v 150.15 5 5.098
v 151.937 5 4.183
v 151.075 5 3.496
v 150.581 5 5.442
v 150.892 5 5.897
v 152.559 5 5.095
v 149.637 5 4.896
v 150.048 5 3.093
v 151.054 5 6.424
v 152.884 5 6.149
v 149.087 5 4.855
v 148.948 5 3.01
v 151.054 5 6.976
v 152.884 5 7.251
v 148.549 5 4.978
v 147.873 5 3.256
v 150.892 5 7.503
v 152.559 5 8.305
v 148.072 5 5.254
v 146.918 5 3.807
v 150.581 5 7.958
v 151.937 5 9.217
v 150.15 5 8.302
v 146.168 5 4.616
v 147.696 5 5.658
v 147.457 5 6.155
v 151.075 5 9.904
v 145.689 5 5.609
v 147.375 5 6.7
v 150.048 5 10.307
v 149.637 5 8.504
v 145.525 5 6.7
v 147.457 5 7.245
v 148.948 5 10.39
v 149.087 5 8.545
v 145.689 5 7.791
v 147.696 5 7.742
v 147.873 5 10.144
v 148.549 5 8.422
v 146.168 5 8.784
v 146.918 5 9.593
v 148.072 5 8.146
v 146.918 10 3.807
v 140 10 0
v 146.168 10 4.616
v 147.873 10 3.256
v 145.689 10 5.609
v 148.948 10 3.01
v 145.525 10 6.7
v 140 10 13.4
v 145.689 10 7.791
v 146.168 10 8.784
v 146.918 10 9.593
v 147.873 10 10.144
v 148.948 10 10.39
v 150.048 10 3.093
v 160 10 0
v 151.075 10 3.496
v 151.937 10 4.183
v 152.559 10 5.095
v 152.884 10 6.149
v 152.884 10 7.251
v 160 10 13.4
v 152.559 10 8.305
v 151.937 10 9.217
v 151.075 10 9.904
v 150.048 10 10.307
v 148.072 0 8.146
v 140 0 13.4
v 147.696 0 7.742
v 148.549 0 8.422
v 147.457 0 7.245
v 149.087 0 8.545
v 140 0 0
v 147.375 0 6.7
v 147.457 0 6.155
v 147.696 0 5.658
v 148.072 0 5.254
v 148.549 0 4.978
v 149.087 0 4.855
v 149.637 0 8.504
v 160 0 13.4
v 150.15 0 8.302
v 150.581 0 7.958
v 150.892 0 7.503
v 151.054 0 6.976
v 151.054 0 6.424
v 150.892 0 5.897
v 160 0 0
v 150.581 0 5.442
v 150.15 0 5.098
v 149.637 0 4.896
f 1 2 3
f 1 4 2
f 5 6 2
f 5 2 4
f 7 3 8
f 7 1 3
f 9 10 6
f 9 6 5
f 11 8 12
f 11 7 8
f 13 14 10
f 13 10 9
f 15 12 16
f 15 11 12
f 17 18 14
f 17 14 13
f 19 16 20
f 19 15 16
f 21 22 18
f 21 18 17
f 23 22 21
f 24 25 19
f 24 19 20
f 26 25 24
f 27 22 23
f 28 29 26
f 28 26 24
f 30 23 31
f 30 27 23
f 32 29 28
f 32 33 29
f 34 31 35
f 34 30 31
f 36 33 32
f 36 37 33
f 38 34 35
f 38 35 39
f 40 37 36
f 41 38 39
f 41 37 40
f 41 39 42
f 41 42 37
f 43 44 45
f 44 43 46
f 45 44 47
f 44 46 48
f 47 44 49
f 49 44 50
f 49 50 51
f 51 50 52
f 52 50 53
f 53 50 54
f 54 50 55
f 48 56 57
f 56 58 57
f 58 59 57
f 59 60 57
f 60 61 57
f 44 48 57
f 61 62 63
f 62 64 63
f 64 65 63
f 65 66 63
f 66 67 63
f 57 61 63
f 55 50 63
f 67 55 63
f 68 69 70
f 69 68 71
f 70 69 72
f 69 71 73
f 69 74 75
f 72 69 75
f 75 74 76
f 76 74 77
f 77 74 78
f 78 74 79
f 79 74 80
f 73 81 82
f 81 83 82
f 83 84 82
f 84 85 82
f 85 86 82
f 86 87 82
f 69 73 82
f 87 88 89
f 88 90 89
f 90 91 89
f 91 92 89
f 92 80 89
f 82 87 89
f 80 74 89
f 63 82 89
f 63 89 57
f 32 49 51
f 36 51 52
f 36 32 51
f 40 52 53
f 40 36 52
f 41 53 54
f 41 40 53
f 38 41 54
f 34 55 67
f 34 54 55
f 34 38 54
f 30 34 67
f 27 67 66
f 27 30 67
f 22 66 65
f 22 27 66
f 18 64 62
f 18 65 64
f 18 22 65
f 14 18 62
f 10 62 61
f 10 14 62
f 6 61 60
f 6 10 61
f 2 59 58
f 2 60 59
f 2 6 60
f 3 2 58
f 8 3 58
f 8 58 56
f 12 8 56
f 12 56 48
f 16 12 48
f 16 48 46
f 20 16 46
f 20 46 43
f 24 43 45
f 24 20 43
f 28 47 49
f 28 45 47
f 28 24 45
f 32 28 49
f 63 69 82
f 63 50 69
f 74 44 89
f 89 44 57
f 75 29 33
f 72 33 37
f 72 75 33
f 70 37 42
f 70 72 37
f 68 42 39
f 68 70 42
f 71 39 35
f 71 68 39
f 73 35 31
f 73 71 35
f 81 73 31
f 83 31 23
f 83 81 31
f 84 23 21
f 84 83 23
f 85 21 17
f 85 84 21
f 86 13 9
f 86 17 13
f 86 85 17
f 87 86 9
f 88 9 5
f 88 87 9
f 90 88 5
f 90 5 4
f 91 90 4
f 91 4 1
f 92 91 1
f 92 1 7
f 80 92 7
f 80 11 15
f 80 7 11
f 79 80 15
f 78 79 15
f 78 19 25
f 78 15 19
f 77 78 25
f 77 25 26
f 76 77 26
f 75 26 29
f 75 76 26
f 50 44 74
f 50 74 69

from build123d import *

# Parameters (mm, degrees)
PAD_DEPTH              = 13.4
CYLINDER_W             = 6.7
CYLINDER_H             = 298.45
CYLINDER_ANGLE         = 180
CYLINDER001_R          = 99.483333
CYLINDER001_DEPTH      = 32
BOX_W                  = 149.225
BOX_H                  = 30
BOX_DEPTH              = 21
BOX001_W               = 33
BOX001_H               = 149.225
BOX001_DEPTH           = 22
CYLINDER002_R          = 3.7
CYLINDER002_DEPTH      = 105
LINEARPATTERN_COUNT    = 3
LINEARPATTERN_PITCH    = 74.6125
CYLINDER003_R          = 1.85
CYLINDER003_DEPTH      = 100
LINEARPATTERN001_COUNT = 3
LINEARPATTERN001_PITCH = 74.6125
CYLINDER004_R          = 2.55
CYLINDER004_DEPTH      = 10
LINEARPATTERN002_COUNT = 3
LINEARPATTERN002_PITCH = 141.16875
BOX002_W               = 100
BOX002_H               = 1000
BOX002_DEPTH           = 100
BOX003_W               = 100
BOX003_H               = 100
BOX003_DEPTH           = 1000
BOX004_W               = 50
BOX004_H               = 100
BOX004_DEPTH           = 100
BOX005_W               = 500
BOX005_H               = 500
BOX005_DEPTH           = 500
BOX006_W               = 37
BOX006_H               = 26
BOX006_DEPTH           = 16


with BuildPart() as part:
    # Sketch → Pad (new body)
    with BuildSketch(Plane.XY):
        Polygon((0, 0), (298.45, 0), (0, 298.45), align=None)
    extrude(amount=PAD_DEPTH)

    # Cylinder → Cylinder (revolve, cut)
    with BuildSketch(Plane(origin=(0, 0, 6.7), x_dir=(0, 0, 1), z_dir=(-1, 0, 0))):
        with Locations((3.35, 149.225)):
            Rectangle(CYLINDER_W, CYLINDER_H)
    revolve(axis=Axis((0, 0, 6.7), (0, 1, 0)), revolution_arc=CYLINDER_ANGLE, mode=Mode.SUBTRACT)

    # Cylinder001 → Cylinder001 (cut)
    with BuildSketch(Plane(origin=(149.225, 149.225, -8), x_dir=(1, 0, 0), z_dir=(0, 0, 1))):
        Circle(CYLINDER001_R)
    extrude(amount=CYLINDER001_DEPTH, mode=Mode.SUBTRACT)

    # Box → Box (cut)
    with BuildSketch(Plane(origin=(149.225, 79.741667, 17), x_dir=(1, 0, 0), z_dir=(0, 0, -1))):
        with Locations((74.6125, 15)):
            Rectangle(BOX_W, BOX_H)
    extrude(amount=BOX_DEPTH, mode=Mode.SUBTRACT)

    # Box001 → Box001 (cut)
    with BuildSketch(Plane(origin=(49.741667, 303.579167, 17), x_dir=(1, 0, 0), z_dir=(0, 0, -1))):
        with Locations((16.5, 74.6125)):
            Rectangle(BOX001_W, BOX001_H)
    extrude(amount=BOX001_DEPTH, mode=Mode.SUBTRACT)

    # Cylinder002 → Cylinder002 (cut)
    with BuildSketch(Plane(origin=(74.6125, 5, 6.7), x_dir=(-1, 0, 0), z_dir=(0, 1, 0))):
        Circle(CYLINDER002_R)
    cylinder002 = extrude(amount=CYLINDER002_DEPTH, mode=Mode.SUBTRACT)

    # LinearPattern: Cylinder002 ×3
    with Locations(*[(i * LINEARPATTERN_PITCH, 0, 0) for i in range(1, LINEARPATTERN_COUNT)]):
        add(cylinder002, mode=Mode.SUBTRACT)

    # Cylinder003 → Cylinder003 (cut)
    with BuildSketch(Plane(origin=(74.6125, 0, 6.7), x_dir=(-1, 0, 0), z_dir=(0, 1, 0))):
        Circle(CYLINDER003_R)
    cylinder003 = extrude(amount=CYLINDER003_DEPTH, mode=Mode.SUBTRACT)

    # LinearPattern001: Cylinder003 ×3
    with Locations(*[(i * LINEARPATTERN001_PITCH, 0, 0) for i in range(1, LINEARPATTERN001_COUNT)]):
        add(cylinder003, mode=Mode.SUBTRACT)

    # Cylinder004 → Cylinder004 (cut)
    with BuildSketch(Plane(origin=(0, 8.05625, 5), x_dir=(1, 0, 0), z_dir=(0, 0, 1))):
        Circle(CYLINDER004_R)
    cylinder004 = extrude(amount=CYLINDER004_DEPTH, mode=Mode.SUBTRACT)

    # LinearPattern002: Cylinder004 ×3
    with Locations(*[(0, i * LINEARPATTERN002_PITCH, 0) for i in range(1, LINEARPATTERN002_COUNT)]):
        add(cylinder004, mode=Mode.SUBTRACT)

    # Box002 → Box002 (cut)
    with BuildSketch(Plane.XY):
        with Locations((50, 500)):
            Rectangle(BOX002_W, BOX002_H)
    extrude(amount=BOX002_DEPTH, mode=Mode.SUBTRACT)

    # Box003 → Box003 (cut)
    with BuildSketch(Plane.YZ.offset(160)):
        with Locations((50, 50)):
            Rectangle(BOX003_W, BOX003_H)
    extrude(amount=BOX003_DEPTH, mode=Mode.SUBTRACT)

    # Box004 → Box004 (cut)
    with BuildSketch(Plane(origin=(90, 78, -74), x_dir=(1, 0, 0), z_dir=(0, -1, 0))):
        with Locations((25, 50)):
            Rectangle(BOX004_W, BOX004_H)
    extrude(amount=BOX004_DEPTH, mode=Mode.SUBTRACT)

    # Box005 → Box005 (cut)
    with BuildSketch(Plane(origin=(0, 25, 0), x_dir=(0, 1, 0), z_dir=(1, 0, 0))):
        with Locations((250, 250)):
            Rectangle(BOX005_W, BOX005_H)
    extrude(amount=BOX005_DEPTH, mode=Mode.SUBTRACT)

    # Box006 → Box006 (cut)
    with BuildSketch(Plane(origin=(136, 26, -5), x_dir=(1, 0, 0), z_dir=(0, -1, 0))):
        with Locations((18.5, 13)):
            Rectangle(BOX006_W, BOX006_H)
    extrude(amount=BOX006_DEPTH, mode=Mode.SUBTRACT)


solid = part.part
